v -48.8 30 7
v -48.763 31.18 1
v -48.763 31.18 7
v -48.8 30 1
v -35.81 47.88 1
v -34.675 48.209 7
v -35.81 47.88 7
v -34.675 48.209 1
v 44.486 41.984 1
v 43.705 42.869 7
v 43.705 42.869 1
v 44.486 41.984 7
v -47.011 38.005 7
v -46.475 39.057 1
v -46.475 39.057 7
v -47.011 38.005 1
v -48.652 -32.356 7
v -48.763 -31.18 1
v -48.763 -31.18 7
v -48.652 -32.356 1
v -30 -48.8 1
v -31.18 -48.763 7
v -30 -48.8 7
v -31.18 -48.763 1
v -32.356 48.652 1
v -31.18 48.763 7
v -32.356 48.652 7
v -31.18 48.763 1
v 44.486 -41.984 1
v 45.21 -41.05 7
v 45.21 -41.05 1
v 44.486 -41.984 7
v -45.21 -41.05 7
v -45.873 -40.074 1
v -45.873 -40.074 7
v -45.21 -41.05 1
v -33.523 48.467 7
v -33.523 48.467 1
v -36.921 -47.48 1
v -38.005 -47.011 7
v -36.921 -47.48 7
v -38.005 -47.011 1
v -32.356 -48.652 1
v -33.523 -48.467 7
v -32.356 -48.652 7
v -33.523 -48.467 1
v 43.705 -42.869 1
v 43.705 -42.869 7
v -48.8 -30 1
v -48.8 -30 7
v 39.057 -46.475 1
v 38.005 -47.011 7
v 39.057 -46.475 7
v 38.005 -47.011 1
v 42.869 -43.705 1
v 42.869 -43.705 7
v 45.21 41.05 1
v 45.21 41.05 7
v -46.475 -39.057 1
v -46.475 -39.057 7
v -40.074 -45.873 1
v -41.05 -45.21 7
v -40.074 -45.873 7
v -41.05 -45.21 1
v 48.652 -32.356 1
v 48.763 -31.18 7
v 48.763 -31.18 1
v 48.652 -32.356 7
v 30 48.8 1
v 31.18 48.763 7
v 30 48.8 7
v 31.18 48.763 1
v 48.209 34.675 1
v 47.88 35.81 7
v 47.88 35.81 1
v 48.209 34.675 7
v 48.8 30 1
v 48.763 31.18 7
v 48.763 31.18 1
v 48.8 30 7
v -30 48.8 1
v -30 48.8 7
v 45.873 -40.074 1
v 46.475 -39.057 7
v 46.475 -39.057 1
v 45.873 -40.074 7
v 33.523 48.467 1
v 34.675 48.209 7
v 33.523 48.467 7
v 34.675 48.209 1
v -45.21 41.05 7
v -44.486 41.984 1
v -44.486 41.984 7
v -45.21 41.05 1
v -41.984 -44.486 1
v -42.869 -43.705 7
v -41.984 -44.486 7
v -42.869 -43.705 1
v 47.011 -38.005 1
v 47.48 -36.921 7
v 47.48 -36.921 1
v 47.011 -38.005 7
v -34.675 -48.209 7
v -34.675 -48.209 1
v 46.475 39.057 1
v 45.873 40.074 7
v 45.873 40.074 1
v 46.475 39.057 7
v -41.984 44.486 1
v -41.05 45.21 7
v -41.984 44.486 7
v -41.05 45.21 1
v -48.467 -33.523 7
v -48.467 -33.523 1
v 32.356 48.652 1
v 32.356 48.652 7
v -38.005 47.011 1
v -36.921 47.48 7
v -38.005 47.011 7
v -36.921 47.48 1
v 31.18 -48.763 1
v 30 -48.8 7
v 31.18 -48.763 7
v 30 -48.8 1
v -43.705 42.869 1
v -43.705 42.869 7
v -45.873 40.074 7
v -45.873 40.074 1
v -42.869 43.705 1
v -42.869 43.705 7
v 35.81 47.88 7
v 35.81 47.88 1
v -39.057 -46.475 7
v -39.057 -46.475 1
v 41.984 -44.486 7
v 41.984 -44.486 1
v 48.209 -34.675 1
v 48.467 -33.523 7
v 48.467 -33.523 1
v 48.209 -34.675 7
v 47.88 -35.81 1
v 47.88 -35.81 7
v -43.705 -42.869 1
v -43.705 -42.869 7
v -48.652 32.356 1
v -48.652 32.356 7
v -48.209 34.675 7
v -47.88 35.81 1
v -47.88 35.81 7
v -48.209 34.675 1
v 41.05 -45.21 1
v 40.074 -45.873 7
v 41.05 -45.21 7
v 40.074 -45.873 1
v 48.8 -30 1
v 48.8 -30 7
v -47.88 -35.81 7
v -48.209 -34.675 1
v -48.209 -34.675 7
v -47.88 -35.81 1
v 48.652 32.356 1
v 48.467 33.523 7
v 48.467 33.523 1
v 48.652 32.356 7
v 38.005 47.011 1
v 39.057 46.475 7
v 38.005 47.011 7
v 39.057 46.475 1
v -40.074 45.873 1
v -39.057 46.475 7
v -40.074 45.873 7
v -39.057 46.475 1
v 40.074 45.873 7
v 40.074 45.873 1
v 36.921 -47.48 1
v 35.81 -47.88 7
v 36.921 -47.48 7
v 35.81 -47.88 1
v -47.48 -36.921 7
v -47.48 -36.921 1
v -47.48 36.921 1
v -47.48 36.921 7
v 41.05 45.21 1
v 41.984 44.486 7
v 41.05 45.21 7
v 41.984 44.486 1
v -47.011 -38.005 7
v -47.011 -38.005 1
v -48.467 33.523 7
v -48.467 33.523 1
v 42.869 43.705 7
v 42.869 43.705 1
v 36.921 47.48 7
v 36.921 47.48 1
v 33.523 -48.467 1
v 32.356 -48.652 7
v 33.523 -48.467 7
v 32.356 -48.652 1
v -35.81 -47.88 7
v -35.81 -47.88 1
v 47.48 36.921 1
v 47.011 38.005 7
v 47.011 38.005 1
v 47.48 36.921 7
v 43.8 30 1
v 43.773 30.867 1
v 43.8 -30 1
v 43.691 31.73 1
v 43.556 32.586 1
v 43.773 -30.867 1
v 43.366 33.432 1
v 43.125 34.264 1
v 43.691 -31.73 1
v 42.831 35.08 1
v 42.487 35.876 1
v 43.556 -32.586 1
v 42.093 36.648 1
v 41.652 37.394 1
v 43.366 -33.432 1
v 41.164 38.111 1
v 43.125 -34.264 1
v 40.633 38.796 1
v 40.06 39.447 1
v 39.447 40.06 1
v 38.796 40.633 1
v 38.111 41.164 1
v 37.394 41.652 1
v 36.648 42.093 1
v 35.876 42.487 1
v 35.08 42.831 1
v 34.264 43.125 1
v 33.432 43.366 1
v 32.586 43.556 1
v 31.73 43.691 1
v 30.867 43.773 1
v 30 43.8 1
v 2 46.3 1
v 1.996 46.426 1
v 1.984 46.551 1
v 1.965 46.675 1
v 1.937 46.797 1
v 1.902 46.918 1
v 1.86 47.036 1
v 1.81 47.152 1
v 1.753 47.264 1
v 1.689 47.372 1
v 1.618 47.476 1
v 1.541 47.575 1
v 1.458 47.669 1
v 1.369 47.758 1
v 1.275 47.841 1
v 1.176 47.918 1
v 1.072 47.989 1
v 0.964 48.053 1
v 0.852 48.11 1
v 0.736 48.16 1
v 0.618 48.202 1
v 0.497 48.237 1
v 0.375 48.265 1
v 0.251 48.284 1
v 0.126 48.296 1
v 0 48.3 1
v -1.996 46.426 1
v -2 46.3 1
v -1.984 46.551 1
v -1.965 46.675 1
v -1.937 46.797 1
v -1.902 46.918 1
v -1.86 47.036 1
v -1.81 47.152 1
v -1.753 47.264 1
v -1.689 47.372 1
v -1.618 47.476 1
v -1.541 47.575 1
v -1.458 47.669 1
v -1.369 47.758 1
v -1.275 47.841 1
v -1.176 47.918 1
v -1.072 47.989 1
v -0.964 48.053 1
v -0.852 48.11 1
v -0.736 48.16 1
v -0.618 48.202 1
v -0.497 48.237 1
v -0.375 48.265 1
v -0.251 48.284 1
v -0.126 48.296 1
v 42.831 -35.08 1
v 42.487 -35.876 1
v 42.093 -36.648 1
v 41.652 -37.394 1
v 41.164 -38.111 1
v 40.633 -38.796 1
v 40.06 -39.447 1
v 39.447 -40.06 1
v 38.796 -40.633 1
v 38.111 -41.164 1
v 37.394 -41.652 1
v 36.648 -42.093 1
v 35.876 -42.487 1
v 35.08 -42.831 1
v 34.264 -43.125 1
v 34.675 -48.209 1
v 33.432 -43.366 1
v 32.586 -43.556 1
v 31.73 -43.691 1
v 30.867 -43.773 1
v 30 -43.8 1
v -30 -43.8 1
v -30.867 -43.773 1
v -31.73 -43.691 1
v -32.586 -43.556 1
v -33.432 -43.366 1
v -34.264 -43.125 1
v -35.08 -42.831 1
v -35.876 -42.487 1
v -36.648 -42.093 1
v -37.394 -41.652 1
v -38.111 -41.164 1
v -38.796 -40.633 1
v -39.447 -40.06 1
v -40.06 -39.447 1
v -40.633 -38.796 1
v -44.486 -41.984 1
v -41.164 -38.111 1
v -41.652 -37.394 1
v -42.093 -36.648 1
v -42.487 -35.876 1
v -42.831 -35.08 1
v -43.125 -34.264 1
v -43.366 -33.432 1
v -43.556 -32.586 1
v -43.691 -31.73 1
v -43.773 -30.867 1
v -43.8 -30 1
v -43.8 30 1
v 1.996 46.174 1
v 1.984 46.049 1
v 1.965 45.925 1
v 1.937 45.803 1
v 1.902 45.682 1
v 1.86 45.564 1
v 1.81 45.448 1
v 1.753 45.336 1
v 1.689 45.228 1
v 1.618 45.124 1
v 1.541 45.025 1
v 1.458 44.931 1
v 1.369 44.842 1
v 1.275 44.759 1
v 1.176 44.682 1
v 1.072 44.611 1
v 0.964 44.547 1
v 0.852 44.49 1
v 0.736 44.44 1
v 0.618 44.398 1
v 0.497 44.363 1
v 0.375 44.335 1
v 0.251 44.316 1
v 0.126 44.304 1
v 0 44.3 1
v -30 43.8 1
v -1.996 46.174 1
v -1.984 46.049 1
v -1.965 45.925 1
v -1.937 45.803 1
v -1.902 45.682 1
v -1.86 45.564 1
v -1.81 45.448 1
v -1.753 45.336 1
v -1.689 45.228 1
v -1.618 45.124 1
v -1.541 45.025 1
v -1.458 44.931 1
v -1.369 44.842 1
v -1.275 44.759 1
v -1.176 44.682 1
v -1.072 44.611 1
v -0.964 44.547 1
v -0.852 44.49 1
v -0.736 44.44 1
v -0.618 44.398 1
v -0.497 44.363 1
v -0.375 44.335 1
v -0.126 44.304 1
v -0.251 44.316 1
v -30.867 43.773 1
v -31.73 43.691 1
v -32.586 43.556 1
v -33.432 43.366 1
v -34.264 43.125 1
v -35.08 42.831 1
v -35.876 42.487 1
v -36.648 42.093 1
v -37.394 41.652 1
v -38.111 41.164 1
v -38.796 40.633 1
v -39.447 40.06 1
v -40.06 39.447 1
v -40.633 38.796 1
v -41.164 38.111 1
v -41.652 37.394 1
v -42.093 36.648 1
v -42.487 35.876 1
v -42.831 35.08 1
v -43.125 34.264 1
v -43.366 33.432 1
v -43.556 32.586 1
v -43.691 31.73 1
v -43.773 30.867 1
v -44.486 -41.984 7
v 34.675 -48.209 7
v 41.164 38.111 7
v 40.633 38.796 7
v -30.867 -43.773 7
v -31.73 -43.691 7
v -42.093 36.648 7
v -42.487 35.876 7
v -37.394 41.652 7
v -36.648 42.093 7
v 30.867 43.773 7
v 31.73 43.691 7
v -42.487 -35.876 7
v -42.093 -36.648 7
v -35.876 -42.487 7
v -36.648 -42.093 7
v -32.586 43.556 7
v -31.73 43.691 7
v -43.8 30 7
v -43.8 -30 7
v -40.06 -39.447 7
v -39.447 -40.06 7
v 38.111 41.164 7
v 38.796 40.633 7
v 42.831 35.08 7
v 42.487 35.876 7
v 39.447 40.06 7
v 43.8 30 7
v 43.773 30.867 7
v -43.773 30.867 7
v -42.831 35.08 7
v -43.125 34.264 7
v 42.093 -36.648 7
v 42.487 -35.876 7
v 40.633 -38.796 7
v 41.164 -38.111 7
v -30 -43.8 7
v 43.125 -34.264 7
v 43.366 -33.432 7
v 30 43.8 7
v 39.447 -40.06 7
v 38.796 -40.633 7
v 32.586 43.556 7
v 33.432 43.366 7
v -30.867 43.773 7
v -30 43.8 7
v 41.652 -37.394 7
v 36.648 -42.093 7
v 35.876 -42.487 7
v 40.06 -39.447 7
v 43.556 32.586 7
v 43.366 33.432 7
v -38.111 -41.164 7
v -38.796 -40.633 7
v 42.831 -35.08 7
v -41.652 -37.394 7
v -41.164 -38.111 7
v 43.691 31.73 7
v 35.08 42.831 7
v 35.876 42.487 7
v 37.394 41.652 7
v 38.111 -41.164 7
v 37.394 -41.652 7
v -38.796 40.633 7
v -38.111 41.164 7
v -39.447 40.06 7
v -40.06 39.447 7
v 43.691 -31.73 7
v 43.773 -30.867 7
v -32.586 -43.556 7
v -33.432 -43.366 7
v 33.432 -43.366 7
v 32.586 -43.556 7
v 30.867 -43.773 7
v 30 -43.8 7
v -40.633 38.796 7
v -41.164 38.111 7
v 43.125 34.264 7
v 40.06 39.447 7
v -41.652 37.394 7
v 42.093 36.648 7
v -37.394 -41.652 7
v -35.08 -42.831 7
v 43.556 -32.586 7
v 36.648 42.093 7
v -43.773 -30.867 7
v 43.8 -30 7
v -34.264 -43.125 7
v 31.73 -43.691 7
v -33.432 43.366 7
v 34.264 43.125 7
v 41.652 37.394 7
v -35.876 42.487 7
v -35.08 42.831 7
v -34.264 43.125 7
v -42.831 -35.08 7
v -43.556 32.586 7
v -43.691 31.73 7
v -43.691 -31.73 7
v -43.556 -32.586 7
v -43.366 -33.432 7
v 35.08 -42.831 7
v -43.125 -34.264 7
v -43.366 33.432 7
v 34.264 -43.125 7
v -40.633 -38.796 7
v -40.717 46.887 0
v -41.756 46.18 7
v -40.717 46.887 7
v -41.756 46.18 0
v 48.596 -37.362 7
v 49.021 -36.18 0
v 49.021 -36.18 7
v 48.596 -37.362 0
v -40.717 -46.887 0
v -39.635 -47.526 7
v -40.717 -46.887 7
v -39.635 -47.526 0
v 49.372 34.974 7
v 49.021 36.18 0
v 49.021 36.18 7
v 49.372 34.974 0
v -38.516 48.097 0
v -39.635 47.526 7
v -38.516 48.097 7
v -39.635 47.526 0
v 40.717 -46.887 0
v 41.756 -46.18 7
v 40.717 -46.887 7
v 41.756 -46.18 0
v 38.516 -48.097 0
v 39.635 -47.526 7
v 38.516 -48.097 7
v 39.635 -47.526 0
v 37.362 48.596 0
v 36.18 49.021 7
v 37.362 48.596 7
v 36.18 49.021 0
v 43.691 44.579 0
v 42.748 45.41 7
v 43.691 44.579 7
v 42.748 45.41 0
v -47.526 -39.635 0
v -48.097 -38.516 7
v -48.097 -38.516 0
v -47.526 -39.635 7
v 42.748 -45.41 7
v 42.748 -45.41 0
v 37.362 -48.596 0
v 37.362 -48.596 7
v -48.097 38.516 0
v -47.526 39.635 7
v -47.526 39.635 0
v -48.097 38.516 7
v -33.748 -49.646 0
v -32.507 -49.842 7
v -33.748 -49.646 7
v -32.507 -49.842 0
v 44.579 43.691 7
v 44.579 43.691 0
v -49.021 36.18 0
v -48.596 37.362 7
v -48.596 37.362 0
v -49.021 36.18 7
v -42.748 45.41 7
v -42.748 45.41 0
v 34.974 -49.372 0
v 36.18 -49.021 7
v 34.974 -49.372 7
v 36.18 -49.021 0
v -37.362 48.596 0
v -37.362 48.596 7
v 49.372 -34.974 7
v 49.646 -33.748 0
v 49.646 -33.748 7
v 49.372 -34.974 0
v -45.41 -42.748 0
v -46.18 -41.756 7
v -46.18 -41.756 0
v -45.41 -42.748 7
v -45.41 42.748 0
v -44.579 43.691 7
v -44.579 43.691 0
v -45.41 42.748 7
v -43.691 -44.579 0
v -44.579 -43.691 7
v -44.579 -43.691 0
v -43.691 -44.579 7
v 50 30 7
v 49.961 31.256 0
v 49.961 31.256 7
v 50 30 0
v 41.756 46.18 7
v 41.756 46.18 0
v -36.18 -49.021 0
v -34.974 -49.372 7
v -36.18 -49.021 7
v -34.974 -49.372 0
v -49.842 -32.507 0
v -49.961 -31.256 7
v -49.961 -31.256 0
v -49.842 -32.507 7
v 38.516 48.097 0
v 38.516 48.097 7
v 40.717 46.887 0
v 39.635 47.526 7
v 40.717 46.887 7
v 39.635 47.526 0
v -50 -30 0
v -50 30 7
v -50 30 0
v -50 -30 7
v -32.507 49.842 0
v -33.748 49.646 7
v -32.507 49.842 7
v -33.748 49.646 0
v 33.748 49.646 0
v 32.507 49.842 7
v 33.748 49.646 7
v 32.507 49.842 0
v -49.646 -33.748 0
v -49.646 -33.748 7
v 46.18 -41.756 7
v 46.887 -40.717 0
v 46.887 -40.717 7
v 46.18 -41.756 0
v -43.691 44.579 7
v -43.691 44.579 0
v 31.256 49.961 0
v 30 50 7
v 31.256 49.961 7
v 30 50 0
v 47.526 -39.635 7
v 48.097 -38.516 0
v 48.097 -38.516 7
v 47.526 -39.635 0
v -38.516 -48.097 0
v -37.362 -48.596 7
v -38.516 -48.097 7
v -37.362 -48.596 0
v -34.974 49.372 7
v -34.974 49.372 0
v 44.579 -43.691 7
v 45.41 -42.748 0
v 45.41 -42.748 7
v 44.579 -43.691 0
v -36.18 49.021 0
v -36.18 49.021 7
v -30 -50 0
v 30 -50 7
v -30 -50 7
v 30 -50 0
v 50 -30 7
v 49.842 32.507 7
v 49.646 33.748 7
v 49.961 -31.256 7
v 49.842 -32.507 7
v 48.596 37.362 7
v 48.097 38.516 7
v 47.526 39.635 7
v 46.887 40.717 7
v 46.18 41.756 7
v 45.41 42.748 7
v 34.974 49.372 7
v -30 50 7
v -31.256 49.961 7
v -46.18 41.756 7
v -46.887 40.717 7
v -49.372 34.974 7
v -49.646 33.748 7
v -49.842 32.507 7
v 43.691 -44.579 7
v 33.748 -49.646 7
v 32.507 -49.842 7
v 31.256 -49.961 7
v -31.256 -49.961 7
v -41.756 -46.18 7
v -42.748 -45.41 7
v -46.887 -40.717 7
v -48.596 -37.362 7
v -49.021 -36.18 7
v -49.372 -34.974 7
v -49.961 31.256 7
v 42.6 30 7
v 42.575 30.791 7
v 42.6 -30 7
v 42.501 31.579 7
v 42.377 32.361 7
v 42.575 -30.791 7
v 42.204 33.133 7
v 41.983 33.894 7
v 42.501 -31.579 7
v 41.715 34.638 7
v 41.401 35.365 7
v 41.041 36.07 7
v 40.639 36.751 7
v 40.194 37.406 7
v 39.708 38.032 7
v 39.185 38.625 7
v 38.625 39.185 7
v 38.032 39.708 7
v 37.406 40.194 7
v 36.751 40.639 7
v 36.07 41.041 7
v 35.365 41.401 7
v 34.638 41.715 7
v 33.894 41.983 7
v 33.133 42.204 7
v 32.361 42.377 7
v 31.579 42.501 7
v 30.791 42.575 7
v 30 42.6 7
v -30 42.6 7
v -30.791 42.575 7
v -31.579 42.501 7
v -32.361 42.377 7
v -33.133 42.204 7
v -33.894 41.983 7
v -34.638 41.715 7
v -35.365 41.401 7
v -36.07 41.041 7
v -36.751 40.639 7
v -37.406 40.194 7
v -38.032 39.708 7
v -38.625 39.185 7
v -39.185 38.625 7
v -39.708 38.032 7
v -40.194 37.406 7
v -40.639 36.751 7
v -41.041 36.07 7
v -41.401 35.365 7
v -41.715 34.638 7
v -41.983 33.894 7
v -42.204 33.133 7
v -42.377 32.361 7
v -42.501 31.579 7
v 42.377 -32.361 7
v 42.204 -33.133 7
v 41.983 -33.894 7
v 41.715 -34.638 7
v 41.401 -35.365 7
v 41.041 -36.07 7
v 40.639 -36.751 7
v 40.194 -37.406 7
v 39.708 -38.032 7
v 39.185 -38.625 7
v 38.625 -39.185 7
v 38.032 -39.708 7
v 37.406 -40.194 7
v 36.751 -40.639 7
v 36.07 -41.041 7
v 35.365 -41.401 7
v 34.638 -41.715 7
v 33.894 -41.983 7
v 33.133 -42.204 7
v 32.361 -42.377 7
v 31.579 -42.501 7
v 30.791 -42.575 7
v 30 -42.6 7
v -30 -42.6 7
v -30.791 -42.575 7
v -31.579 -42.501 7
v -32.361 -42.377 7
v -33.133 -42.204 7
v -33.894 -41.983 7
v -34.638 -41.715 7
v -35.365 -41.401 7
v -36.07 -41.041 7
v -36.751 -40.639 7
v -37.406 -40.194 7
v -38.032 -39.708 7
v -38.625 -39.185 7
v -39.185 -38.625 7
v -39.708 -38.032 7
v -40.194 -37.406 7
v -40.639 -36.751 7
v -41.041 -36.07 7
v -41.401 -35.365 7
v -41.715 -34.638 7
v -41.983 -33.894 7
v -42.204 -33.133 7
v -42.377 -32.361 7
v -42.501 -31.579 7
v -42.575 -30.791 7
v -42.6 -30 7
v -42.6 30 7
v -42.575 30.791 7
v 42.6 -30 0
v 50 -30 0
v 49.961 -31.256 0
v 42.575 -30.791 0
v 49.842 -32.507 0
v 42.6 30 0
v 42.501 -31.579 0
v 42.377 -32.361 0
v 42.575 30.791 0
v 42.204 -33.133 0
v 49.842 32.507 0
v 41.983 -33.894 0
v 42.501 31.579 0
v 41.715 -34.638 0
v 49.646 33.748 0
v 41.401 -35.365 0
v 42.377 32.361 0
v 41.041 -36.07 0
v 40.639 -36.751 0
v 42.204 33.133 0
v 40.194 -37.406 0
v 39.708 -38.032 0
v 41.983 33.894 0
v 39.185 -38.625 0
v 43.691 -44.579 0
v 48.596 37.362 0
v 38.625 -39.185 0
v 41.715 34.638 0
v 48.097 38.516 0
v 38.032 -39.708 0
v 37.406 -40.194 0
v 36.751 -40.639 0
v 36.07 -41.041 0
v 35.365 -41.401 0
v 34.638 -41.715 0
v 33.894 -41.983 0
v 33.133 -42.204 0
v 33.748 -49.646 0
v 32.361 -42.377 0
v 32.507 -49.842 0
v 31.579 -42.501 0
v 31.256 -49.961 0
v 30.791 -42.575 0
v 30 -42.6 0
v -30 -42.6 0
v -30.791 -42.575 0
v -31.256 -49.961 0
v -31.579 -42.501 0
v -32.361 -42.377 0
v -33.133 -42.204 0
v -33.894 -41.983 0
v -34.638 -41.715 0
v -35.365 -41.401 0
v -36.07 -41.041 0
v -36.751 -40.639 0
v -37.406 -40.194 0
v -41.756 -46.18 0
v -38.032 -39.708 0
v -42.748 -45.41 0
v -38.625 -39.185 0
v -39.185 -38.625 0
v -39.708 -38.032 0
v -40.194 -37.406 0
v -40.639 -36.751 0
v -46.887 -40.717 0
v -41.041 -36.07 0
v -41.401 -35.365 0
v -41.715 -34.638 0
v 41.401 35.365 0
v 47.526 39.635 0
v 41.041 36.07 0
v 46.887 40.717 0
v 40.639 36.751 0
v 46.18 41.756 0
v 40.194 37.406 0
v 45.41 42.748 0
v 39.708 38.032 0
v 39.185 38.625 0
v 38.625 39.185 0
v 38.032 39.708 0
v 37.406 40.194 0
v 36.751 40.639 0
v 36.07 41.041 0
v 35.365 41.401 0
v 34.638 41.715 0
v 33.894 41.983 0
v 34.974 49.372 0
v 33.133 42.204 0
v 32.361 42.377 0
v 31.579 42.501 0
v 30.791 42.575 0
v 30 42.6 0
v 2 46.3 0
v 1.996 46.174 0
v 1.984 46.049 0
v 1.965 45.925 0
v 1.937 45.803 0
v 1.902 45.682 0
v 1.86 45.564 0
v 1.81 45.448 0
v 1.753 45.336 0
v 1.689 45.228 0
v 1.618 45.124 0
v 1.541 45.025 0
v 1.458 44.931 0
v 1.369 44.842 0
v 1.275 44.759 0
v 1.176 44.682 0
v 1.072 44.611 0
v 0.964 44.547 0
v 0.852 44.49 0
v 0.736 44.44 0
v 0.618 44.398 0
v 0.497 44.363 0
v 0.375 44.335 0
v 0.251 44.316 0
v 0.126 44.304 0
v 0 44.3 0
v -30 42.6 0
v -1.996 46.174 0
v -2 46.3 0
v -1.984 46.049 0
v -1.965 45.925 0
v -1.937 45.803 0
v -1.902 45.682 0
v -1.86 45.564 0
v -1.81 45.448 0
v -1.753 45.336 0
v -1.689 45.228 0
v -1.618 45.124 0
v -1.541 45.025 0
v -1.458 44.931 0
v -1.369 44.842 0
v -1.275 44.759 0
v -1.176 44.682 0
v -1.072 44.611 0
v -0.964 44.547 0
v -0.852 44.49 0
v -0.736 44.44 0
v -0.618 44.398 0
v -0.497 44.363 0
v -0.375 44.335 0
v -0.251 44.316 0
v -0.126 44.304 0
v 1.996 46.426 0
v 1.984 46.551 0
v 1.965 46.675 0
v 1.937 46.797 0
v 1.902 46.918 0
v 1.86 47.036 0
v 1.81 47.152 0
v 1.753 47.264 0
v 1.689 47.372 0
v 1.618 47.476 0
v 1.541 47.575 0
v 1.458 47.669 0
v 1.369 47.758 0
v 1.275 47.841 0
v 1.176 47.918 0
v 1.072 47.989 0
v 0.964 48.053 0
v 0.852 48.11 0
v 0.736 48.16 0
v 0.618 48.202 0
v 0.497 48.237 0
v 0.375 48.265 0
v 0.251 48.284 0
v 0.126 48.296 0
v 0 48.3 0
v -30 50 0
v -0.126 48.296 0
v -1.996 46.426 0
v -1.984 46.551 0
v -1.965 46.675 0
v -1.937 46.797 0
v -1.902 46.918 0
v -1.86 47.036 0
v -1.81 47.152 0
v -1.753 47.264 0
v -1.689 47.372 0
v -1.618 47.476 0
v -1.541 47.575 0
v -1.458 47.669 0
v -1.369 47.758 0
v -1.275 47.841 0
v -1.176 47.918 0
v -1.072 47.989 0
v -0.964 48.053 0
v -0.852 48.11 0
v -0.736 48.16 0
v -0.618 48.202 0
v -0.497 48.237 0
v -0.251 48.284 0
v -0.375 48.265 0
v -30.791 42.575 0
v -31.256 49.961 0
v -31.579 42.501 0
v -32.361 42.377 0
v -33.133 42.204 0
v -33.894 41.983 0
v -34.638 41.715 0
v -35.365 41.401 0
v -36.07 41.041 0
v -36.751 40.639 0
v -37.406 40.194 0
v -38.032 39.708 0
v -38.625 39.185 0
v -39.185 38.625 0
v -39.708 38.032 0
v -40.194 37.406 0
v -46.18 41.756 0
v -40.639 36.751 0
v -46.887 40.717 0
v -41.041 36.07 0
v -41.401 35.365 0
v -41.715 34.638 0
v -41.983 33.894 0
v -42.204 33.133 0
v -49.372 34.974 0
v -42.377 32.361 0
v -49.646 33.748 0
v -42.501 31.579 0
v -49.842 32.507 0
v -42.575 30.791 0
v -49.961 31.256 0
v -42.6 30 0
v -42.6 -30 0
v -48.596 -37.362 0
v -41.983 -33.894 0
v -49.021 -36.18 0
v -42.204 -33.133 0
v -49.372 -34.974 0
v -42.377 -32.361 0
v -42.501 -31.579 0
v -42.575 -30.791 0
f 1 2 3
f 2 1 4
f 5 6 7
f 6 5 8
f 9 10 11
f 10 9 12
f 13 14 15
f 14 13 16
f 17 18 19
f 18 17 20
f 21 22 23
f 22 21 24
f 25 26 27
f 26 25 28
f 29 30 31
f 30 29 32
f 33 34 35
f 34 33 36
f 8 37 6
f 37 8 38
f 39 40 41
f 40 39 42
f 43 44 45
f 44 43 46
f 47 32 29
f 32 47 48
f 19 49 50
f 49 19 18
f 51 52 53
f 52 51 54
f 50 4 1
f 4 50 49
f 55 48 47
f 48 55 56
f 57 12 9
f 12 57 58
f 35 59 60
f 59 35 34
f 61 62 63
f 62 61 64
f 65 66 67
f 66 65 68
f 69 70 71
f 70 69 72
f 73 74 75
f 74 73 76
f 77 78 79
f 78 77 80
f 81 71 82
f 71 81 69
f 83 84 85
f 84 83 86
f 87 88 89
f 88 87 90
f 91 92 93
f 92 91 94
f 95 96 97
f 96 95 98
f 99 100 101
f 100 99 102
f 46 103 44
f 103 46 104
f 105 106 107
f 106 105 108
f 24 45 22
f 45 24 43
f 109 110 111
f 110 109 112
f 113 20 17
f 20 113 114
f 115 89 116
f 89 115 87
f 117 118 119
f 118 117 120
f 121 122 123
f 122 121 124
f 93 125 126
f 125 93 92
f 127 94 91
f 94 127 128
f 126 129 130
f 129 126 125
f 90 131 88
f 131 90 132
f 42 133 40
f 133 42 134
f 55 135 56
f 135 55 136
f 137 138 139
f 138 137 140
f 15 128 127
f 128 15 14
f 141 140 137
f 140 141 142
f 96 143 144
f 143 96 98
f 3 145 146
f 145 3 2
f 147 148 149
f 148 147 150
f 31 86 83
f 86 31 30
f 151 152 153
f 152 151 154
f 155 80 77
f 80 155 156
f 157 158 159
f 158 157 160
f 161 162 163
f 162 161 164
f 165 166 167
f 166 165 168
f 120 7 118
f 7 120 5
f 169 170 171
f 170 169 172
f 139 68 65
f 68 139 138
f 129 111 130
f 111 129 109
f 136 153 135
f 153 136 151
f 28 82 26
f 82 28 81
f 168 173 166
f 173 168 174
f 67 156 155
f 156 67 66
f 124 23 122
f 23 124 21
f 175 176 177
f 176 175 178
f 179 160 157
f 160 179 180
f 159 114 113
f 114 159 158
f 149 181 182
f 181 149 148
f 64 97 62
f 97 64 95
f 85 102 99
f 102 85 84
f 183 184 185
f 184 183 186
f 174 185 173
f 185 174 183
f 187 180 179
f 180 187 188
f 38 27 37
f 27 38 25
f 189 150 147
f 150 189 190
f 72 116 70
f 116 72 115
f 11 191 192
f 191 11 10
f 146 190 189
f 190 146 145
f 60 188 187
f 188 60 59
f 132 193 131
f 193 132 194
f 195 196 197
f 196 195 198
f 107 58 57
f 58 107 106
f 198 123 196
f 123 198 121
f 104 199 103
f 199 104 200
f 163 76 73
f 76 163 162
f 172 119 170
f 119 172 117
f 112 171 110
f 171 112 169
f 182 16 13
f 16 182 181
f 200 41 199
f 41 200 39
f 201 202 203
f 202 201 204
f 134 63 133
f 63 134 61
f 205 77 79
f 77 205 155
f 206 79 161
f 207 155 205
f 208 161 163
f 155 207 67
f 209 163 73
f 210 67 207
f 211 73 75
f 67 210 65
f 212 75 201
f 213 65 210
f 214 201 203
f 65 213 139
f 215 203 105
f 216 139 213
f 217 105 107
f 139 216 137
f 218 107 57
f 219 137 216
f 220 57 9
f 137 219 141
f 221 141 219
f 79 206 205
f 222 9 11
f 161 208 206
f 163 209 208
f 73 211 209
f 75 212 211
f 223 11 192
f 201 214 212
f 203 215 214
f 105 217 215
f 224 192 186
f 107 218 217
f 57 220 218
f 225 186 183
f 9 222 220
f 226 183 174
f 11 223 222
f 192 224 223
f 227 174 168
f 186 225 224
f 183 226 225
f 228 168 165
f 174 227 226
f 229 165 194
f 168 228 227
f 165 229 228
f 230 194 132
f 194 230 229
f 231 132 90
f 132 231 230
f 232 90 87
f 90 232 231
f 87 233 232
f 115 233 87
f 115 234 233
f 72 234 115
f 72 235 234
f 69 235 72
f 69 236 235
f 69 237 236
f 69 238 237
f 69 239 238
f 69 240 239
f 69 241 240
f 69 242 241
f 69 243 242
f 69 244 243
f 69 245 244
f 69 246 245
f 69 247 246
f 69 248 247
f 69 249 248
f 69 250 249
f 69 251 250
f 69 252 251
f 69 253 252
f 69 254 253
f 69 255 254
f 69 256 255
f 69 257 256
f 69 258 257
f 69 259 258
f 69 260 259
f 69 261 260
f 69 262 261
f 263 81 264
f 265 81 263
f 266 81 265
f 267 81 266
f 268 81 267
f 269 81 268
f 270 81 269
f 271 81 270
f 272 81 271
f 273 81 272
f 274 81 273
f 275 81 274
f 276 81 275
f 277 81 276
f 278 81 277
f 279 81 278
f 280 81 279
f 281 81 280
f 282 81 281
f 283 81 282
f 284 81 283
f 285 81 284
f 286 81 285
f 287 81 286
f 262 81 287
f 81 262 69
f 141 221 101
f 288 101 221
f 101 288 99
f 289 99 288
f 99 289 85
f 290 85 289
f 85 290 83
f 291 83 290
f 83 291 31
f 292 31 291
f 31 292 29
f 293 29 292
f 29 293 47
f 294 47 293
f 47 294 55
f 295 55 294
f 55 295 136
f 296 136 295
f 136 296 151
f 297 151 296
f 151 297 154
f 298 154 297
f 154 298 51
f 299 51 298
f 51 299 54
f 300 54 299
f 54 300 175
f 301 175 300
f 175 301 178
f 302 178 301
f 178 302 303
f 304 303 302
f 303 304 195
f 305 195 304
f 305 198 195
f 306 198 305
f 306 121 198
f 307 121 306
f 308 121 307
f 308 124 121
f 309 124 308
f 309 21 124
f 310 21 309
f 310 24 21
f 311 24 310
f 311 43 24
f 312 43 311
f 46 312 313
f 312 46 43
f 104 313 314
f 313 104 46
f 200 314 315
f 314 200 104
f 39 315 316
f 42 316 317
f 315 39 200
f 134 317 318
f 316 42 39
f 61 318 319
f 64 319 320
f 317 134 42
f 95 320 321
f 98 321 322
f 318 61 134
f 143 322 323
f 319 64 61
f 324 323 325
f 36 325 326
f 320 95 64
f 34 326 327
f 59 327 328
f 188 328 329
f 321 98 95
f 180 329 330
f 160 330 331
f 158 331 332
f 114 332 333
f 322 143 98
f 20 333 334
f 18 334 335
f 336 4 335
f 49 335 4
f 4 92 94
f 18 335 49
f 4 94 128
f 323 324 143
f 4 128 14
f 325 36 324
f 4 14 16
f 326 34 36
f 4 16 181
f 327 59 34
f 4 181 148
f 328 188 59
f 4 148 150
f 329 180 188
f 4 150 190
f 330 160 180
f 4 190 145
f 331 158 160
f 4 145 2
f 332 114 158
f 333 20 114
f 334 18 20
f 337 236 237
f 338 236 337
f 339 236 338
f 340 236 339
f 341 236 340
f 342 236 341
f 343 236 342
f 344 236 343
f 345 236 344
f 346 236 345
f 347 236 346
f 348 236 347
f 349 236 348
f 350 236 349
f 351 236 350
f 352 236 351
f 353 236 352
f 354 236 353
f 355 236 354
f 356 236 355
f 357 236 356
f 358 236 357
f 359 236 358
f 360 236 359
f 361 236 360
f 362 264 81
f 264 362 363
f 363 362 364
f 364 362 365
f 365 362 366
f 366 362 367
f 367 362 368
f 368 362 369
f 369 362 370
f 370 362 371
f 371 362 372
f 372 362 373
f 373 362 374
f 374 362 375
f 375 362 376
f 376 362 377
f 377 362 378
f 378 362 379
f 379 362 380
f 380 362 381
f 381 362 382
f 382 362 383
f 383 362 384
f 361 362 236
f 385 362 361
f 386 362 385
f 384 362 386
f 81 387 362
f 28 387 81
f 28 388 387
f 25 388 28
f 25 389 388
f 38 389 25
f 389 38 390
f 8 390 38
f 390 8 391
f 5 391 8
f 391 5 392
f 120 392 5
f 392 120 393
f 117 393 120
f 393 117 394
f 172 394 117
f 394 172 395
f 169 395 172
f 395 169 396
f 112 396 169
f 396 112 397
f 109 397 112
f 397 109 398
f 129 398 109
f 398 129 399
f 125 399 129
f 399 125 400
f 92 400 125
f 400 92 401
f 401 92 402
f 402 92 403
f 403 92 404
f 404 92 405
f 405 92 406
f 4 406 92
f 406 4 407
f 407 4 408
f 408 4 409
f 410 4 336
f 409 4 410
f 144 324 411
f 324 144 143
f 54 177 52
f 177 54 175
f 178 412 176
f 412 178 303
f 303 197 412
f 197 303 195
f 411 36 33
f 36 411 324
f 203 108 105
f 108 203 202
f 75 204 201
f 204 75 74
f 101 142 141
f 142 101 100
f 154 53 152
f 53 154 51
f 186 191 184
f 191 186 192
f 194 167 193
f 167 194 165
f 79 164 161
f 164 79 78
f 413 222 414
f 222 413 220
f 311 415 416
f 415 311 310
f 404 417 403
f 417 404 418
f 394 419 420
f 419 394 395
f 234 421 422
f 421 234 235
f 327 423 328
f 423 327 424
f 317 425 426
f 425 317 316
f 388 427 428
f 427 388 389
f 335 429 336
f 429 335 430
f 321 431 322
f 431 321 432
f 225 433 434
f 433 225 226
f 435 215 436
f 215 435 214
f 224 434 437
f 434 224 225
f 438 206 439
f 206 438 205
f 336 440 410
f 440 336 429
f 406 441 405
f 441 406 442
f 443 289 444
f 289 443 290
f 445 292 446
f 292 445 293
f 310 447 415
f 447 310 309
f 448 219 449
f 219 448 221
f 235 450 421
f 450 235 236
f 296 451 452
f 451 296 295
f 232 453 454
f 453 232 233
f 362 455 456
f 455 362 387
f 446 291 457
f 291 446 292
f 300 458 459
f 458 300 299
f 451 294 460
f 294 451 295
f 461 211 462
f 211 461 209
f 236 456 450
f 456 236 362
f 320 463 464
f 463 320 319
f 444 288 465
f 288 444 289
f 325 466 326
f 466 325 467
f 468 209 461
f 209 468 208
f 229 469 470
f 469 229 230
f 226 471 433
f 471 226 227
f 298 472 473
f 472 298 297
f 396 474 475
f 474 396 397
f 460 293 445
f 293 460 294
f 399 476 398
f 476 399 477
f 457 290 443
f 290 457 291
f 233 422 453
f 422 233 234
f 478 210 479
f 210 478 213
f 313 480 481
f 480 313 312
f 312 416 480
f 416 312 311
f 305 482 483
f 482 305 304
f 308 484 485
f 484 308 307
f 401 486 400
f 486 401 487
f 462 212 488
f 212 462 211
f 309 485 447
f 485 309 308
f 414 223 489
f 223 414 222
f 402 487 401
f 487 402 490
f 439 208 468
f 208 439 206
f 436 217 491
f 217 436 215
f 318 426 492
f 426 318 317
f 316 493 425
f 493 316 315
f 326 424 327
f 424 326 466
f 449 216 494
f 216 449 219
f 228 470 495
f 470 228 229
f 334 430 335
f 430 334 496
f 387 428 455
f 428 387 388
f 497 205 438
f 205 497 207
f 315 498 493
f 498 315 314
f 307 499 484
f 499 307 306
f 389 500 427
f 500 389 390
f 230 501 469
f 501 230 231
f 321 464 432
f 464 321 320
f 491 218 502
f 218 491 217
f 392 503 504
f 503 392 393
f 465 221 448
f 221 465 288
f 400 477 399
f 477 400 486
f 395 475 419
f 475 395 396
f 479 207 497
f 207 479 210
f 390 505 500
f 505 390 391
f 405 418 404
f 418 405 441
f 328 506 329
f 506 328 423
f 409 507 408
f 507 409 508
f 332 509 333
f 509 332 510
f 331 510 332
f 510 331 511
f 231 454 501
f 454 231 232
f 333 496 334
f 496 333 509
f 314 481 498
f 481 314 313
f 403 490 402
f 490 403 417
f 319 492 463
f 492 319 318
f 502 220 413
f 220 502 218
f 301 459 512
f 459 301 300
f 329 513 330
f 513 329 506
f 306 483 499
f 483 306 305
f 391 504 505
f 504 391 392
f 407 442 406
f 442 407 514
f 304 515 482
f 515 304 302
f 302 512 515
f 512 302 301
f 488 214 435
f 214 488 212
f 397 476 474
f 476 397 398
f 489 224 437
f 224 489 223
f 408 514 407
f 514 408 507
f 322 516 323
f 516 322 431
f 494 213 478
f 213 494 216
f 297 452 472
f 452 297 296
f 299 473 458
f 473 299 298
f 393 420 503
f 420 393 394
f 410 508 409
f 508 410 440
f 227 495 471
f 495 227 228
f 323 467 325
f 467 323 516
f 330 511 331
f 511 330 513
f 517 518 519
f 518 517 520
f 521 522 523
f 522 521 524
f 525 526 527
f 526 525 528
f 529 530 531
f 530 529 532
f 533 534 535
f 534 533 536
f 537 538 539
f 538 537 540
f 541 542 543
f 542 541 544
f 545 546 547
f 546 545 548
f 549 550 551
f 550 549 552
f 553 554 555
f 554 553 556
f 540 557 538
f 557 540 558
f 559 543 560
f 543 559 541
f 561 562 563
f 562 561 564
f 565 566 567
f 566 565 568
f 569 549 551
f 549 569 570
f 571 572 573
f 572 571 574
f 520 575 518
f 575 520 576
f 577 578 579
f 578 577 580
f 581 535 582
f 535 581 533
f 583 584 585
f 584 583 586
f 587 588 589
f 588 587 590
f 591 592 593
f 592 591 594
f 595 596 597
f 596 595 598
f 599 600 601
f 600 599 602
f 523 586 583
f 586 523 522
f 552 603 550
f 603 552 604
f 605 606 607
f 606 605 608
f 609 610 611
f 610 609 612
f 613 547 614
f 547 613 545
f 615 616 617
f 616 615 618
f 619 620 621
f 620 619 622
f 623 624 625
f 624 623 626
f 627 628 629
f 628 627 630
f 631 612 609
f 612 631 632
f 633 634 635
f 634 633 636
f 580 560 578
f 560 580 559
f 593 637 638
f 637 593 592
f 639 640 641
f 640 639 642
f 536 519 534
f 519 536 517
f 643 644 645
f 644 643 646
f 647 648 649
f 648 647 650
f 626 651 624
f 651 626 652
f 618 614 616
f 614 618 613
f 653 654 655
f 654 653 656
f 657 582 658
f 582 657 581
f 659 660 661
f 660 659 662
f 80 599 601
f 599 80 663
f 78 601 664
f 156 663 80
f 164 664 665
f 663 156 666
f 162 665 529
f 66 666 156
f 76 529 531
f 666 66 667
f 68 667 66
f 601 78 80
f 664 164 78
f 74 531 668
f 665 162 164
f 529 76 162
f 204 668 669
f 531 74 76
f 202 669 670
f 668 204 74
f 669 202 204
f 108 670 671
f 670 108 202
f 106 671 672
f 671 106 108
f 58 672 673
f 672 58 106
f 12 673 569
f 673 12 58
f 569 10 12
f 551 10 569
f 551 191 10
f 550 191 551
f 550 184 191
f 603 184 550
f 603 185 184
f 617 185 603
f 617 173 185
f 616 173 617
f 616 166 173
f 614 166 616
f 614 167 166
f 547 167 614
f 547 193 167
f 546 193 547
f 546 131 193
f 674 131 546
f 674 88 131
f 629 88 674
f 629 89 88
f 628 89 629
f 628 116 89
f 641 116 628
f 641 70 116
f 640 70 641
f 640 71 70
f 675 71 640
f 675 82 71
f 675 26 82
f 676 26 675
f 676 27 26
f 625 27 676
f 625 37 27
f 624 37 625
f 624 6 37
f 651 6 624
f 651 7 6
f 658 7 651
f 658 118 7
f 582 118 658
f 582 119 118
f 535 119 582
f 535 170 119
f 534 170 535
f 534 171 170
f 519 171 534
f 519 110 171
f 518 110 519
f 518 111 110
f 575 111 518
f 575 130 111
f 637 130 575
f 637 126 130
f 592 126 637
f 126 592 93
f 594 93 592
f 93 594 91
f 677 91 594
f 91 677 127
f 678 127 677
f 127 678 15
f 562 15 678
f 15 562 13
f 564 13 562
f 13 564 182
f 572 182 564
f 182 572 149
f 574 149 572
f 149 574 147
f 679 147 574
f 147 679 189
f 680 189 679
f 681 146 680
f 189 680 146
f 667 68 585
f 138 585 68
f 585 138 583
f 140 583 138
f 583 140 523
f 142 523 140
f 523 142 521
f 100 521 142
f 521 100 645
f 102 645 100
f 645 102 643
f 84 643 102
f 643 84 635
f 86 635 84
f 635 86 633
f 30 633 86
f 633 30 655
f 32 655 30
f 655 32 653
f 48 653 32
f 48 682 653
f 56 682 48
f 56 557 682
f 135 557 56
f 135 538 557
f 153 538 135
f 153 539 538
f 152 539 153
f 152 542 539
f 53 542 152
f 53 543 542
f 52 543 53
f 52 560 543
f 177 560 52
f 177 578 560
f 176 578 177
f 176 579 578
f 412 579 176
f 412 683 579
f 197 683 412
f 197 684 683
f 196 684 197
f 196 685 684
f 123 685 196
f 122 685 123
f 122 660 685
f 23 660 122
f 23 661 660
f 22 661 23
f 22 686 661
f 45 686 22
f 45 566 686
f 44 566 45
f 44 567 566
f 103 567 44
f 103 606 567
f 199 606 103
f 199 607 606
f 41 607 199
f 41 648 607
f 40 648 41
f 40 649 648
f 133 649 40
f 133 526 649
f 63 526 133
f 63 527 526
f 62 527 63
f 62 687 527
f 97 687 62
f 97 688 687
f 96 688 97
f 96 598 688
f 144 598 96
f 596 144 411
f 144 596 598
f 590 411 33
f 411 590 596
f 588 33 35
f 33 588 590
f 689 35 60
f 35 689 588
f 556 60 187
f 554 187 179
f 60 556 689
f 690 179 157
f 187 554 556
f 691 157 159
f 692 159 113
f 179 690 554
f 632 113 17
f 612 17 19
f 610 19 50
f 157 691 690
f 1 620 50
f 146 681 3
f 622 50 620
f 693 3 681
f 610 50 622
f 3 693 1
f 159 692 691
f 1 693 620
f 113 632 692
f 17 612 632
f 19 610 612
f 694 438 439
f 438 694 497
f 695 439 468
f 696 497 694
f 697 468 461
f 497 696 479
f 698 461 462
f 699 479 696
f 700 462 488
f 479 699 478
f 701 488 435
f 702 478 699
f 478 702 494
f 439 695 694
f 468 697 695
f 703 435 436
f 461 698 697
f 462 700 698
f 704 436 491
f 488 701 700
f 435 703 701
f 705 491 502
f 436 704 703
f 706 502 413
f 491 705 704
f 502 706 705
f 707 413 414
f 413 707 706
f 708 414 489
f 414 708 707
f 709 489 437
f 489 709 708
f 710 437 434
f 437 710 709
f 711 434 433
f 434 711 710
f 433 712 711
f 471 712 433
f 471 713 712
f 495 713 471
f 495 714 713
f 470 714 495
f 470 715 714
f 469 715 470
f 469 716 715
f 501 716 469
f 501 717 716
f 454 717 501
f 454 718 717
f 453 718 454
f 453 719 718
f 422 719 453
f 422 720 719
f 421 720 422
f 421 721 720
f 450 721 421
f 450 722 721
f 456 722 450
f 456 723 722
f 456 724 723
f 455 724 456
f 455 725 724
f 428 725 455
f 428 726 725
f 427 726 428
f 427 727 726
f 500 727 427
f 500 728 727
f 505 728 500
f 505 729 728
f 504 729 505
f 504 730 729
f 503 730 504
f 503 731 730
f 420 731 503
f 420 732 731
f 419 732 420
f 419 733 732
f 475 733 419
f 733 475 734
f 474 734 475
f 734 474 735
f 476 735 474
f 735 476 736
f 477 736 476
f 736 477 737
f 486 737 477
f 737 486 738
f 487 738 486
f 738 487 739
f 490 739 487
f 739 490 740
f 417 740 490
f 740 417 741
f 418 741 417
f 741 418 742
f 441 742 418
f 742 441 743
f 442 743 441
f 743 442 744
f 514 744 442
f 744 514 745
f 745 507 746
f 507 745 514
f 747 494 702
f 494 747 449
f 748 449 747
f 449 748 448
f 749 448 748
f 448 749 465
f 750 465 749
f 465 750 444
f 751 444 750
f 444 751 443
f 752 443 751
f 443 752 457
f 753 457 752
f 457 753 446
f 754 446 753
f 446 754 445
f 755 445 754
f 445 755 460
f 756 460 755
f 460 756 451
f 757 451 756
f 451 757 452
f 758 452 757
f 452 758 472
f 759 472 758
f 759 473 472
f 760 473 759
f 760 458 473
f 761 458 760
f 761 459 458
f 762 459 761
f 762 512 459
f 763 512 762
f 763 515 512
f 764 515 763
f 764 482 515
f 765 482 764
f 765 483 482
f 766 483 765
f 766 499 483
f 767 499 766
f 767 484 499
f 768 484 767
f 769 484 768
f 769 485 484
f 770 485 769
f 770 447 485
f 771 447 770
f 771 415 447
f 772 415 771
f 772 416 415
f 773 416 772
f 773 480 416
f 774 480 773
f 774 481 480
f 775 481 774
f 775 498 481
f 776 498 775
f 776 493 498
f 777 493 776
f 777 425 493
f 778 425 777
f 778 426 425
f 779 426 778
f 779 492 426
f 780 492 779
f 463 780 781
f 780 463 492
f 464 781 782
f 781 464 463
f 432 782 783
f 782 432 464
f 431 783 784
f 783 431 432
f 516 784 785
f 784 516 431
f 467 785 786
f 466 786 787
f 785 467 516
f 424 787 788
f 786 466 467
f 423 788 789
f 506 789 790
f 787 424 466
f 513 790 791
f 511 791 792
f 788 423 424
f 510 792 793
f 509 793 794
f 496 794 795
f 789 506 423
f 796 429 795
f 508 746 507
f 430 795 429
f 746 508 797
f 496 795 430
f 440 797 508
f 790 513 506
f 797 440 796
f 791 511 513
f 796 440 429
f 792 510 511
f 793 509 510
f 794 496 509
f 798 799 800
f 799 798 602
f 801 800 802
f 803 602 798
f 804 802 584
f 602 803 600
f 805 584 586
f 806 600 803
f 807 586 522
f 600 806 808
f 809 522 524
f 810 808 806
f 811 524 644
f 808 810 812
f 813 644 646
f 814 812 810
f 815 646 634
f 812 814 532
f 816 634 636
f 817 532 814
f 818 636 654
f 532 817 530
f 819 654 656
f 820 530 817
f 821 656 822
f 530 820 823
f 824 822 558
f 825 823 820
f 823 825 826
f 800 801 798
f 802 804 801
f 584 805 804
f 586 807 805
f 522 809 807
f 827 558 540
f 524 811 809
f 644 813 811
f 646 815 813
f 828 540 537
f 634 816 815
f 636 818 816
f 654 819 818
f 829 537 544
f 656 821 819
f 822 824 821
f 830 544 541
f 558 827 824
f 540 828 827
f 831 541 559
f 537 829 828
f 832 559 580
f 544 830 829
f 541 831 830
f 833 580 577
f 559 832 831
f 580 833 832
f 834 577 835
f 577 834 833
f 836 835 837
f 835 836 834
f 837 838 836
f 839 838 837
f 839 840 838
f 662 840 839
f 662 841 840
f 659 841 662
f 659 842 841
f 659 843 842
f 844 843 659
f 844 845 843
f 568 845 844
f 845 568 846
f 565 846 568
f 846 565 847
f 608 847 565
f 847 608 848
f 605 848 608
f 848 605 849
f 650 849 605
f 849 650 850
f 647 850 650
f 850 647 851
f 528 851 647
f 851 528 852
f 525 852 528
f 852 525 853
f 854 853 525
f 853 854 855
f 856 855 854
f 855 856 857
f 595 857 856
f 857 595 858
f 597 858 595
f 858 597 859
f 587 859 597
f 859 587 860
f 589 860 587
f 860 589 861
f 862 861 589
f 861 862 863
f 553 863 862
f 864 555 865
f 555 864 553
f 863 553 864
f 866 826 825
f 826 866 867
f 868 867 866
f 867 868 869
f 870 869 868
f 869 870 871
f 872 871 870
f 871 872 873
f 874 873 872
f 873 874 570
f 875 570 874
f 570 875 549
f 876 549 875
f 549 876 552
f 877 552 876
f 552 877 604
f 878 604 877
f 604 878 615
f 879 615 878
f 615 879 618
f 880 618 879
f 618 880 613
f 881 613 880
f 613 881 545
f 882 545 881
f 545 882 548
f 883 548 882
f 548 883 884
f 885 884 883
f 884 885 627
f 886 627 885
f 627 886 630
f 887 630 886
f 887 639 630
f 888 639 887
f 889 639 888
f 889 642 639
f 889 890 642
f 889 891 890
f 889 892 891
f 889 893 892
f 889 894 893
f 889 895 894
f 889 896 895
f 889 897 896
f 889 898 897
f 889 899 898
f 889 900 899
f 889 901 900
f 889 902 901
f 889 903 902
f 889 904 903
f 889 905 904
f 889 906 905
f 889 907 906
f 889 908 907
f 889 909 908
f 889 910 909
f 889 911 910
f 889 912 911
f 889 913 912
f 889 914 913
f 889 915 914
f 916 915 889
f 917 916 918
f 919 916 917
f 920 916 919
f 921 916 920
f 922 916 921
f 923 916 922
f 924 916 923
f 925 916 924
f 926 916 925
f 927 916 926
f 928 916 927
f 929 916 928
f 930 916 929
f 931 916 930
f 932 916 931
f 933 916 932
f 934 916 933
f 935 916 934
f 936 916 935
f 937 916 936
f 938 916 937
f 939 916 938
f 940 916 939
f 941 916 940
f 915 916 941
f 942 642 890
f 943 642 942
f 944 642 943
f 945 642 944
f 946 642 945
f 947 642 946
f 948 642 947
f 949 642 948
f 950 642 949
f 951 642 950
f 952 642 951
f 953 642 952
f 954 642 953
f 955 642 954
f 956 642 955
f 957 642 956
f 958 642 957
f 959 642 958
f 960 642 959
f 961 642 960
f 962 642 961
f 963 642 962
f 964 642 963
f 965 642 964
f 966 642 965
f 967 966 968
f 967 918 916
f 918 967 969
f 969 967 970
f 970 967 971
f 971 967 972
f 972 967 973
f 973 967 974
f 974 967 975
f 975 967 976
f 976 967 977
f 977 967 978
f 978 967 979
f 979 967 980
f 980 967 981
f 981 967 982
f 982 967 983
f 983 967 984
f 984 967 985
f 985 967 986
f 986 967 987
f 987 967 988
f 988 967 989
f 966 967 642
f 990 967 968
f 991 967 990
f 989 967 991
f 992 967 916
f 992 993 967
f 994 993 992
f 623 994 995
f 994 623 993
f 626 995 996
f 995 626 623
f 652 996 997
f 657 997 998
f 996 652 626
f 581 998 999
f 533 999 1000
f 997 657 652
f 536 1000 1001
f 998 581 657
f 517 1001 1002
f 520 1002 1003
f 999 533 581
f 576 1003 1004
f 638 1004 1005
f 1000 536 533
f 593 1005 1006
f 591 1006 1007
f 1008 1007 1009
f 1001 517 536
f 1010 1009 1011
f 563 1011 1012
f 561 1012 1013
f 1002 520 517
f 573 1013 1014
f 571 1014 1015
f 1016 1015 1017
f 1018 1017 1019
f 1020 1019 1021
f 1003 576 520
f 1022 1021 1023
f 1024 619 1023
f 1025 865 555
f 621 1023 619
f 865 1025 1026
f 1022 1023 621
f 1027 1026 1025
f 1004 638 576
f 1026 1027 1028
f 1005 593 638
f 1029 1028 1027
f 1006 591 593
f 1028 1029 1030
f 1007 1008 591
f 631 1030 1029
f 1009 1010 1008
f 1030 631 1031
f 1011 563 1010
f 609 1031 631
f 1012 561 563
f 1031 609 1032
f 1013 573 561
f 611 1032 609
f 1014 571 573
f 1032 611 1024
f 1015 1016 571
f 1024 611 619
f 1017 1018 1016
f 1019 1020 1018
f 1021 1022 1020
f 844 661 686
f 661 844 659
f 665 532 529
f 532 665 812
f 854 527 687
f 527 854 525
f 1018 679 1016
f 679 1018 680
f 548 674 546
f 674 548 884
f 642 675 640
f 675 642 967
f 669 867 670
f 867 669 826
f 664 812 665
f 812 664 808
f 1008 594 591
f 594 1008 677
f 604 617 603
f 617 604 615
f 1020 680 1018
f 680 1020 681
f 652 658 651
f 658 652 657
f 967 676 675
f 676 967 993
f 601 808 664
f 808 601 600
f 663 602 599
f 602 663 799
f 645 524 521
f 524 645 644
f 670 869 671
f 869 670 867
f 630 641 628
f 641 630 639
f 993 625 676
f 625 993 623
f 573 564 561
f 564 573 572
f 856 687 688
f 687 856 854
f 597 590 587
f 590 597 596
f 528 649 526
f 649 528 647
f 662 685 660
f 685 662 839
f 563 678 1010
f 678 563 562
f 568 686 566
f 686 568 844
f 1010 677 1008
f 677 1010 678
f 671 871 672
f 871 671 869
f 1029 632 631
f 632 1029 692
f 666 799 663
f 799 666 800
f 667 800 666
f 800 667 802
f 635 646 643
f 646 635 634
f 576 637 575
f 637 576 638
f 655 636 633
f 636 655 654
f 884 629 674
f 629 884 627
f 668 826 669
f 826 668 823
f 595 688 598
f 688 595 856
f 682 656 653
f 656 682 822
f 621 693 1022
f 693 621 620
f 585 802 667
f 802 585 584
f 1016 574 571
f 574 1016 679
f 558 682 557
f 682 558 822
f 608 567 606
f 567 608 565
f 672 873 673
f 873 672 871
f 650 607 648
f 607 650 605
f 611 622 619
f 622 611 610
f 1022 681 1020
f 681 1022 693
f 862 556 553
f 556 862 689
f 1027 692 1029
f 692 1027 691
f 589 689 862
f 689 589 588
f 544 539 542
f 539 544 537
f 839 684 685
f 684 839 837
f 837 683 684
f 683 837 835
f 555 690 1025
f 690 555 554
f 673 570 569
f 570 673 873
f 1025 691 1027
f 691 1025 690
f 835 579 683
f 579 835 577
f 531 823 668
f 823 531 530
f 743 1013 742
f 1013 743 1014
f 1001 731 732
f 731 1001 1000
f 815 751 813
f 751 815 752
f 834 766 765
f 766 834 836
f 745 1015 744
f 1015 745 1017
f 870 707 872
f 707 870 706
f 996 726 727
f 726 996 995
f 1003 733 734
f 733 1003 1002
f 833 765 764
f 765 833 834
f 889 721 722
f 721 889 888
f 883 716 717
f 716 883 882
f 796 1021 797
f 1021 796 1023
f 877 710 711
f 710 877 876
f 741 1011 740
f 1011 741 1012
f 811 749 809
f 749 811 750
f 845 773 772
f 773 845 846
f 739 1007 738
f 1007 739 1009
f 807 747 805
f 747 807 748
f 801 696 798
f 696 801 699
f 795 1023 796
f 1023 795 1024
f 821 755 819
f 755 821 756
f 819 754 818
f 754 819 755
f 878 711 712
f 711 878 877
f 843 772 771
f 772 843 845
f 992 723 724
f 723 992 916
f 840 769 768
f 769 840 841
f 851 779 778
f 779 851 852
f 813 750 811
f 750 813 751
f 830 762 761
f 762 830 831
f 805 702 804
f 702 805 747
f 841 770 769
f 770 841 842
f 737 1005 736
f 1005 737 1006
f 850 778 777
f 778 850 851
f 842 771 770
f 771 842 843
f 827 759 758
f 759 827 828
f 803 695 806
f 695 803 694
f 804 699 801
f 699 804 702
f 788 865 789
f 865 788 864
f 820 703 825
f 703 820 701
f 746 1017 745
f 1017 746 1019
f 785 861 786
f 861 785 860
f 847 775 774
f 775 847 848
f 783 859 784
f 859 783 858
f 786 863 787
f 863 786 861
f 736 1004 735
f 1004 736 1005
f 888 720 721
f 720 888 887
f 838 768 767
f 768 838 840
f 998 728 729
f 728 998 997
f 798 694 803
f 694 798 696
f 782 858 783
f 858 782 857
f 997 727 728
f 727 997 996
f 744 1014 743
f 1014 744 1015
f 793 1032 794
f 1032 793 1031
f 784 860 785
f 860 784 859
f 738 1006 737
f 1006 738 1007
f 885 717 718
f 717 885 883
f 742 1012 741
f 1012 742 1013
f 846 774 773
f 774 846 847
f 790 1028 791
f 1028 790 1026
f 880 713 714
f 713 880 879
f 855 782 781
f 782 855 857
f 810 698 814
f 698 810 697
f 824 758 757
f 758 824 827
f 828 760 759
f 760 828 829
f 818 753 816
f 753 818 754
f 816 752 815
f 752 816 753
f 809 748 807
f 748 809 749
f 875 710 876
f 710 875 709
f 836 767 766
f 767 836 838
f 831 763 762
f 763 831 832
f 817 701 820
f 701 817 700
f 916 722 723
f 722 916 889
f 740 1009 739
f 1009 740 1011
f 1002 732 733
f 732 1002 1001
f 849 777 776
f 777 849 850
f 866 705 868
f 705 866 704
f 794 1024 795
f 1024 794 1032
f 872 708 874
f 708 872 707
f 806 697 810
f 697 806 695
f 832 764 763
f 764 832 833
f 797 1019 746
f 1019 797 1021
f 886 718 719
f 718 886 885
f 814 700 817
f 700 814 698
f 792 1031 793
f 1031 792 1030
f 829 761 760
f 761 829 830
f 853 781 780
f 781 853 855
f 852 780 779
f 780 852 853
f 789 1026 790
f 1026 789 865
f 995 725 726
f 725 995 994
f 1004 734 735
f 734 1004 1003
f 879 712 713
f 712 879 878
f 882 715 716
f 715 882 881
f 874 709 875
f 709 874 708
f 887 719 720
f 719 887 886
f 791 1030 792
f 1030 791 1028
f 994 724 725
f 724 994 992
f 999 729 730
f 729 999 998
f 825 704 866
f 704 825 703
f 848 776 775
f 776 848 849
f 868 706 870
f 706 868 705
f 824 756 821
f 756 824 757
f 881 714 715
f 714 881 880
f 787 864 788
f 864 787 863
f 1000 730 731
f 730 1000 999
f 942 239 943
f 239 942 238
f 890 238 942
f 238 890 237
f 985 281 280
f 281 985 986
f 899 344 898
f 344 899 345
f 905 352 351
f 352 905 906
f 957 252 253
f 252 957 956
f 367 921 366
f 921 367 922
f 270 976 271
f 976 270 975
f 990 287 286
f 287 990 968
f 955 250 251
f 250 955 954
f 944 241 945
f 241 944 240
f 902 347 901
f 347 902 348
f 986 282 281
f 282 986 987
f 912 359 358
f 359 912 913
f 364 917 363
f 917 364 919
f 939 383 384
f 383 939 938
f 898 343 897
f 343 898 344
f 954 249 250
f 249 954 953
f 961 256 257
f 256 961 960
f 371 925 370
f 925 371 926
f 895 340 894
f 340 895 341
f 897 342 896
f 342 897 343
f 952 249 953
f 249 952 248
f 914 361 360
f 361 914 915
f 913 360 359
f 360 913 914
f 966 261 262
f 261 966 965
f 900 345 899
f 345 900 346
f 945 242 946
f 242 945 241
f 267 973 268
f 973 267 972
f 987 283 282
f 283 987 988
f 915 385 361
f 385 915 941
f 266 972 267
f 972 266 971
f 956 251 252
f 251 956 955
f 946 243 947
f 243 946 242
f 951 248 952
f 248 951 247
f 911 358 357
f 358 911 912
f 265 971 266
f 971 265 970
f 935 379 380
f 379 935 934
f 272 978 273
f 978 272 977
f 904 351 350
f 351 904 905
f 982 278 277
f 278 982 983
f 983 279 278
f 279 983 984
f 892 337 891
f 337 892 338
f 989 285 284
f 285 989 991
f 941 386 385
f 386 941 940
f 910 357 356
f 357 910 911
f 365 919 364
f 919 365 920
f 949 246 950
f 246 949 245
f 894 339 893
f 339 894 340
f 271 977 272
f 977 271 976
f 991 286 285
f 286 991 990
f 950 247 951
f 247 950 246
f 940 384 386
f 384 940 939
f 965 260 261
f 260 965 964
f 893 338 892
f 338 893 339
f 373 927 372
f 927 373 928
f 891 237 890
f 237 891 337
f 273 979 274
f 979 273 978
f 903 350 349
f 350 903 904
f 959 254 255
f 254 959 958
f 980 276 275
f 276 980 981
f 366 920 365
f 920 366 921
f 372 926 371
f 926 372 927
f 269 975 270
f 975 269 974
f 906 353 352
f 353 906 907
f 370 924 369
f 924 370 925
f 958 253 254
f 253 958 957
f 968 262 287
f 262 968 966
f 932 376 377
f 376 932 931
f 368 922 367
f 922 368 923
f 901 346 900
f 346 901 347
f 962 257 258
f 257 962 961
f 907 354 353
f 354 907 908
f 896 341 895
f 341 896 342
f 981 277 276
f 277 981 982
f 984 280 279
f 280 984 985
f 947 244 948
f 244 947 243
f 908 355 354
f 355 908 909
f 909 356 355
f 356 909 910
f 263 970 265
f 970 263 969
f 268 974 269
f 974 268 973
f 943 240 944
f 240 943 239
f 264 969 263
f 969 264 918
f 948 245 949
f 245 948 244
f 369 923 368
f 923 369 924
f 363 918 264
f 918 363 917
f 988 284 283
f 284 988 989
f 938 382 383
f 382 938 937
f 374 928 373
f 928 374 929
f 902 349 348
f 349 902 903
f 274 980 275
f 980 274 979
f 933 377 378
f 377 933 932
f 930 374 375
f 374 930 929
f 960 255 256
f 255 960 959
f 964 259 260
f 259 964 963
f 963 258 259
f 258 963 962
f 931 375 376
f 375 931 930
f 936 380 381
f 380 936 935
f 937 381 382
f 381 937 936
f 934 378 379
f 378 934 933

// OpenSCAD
//LED neon square frame
//Adjust these main variables to suit
thick=5;     //thickness of LED neon strip
width=100; //width of frame
//More specialist variables
height=6;   //depth of groove
wall=1.2;    //wall thickness
curve=20;  //corner outer radius
$fn=100;    //circle segments
//Don't change variables below here
wl=wall*2;
crv=curve*2;
thk=thick*2;
crz=(width/2)-curve;
difference(){
//main frame
hull() {
translate([-crz,crz,0])
cylinder(h=height+1, d=crv);
translate([crz,crz,0])
cylinder(h=height+1, d=crv);
translate([-crz,-crz,0])
cylinder(h=height+1, d=crv);
translate([crz,-crz,0])
cylinder(h=height+1, d=crv);
}
//central void
hull() {
translate([-crz,crz,-1])
cylinder(h=height+3, d=crv-wl-wl-thk);
translate([crz,crz,-1])
cylinder(h=height+3, d=crv-wl-wl-thk);
translate([-crz,-crz,-1])
cylinder(h=height+3, d=crv-wl-wl-thk);
translate([crz,-crz,-1])
cylinder(h=height+3, d=crv-wl-wl-thk);
}
//cable hole
translate([0,(width/2)-wall-(thick/2),-1])
cylinder(h=height+2, d=thick-1);
difference(){
//channel groove outer
hull() {
translate([-crz,crz,1])
cylinder(h=height+1, d=crv-wl);
translate([crz,crz,1])
cylinder(h=height+1, d=crv-wl);
translate([-crz,-crz,1])
cylinder(h=height+1, d=crv-wl);
translate([crz,-crz,1])
cylinder(h=height+1, d=crv-wl);
}
//channel groove inner
hull() {
translate([-crz,crz,1])
cylinder(h=height+1, d=crv-wl-thk);
translate([crz,crz,1])
cylinder(h=height+1, d=crv-wl-thk);
translate([-crz,-crz,1])
cylinder(h=height+1, d=crv-wl-thk);
translate([crz,-crz,1])
cylinder(h=height+1, d=crv-wl-thk);
}
}
}
